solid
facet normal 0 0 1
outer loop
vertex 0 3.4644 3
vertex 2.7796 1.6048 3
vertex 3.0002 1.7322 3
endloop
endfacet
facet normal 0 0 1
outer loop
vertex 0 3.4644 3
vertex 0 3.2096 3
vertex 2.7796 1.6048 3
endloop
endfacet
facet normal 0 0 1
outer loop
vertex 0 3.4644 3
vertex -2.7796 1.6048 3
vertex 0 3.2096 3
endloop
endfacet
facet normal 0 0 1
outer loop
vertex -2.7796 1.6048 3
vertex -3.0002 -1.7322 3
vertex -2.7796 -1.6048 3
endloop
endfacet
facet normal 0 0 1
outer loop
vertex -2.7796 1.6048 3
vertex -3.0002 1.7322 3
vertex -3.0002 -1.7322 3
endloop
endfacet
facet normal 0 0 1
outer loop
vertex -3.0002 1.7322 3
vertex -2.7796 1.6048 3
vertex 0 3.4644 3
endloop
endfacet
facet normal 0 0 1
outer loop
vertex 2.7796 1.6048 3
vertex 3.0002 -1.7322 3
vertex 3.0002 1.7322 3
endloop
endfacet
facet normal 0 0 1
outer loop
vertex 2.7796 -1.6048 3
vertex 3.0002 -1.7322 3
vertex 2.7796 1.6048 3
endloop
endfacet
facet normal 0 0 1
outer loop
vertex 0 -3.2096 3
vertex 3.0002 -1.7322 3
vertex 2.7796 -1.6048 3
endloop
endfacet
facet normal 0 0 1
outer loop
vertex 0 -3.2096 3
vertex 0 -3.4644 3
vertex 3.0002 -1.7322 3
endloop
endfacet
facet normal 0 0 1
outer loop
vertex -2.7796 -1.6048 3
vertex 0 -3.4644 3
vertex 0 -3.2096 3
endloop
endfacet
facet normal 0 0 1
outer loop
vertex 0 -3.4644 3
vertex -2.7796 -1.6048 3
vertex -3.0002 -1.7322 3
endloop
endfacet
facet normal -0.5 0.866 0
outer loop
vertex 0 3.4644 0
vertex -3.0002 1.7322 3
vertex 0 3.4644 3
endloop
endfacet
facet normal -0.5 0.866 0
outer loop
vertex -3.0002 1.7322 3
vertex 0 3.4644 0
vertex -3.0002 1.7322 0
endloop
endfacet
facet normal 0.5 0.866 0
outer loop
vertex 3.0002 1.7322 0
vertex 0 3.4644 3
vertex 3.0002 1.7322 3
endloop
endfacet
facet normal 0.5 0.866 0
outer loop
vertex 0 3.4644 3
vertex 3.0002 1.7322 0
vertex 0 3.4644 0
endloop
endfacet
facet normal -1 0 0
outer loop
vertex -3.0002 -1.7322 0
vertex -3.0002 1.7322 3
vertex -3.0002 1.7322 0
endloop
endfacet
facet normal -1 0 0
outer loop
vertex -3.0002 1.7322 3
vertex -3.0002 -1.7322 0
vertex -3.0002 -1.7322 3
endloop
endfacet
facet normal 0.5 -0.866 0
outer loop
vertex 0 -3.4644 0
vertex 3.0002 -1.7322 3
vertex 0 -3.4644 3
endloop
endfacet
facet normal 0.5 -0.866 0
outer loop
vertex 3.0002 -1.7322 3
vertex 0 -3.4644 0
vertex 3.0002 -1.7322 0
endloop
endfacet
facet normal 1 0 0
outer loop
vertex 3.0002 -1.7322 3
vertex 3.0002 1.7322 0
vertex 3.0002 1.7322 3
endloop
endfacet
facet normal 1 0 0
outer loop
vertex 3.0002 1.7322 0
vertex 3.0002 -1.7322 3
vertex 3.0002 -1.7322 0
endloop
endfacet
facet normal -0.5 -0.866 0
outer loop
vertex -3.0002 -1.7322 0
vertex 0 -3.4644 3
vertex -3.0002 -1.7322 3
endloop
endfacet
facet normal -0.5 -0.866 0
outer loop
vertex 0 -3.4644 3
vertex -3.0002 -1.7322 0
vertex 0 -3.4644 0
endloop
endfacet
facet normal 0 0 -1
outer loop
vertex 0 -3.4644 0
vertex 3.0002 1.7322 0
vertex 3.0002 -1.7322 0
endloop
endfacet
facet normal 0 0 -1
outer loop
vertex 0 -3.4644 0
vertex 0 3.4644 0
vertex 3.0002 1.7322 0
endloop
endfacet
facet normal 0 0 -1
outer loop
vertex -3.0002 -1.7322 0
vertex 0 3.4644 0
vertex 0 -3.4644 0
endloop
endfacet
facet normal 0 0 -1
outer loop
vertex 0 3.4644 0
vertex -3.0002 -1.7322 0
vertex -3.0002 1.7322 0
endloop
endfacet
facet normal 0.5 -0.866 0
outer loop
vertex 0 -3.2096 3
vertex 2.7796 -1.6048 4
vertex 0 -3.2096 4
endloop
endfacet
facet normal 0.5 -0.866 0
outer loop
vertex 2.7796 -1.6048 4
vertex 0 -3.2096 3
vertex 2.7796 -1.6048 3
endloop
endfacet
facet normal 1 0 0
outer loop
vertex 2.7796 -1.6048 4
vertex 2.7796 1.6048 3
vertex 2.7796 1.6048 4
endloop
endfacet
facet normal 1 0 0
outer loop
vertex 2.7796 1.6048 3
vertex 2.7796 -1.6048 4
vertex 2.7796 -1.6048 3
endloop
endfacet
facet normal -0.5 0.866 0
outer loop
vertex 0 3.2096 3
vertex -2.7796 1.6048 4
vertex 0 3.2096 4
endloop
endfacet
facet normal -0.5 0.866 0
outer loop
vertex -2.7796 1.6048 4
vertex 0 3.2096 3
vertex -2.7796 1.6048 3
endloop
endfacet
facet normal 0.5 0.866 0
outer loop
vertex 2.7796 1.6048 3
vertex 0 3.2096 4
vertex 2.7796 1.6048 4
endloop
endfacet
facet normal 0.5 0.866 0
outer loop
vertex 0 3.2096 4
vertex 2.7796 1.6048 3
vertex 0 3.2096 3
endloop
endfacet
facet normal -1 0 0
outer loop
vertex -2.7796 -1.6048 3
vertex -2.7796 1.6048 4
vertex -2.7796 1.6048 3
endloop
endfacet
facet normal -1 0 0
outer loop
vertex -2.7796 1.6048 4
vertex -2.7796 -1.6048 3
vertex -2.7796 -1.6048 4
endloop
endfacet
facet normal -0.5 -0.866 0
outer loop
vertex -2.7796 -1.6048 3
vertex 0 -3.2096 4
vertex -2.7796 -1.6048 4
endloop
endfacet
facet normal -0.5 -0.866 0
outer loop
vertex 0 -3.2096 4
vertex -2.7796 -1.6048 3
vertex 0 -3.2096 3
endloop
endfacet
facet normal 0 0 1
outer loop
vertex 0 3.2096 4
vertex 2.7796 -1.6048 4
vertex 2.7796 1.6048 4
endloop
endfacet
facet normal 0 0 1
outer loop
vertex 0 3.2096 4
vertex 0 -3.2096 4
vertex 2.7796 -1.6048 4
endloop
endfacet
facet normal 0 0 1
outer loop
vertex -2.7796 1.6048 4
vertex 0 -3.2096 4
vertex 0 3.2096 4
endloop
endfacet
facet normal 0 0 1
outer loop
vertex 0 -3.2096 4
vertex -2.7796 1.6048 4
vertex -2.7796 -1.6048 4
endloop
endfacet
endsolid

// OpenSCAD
group() {
								group() {
									union() {
										multmatrix([[0.866025, -0.5, 0, 0], [0.5, 0.866025, 0, 0], [0, 0, 1, 0], [0, 0, 0, 1]]) {
											group() {
												multmatrix([[1, 0, 0, 0], [0, 1, 0, 0], [0, 0, 1, 0], [0, 0, 0, 1]]) {
													group() {
														cylinder($fn = 6, $fa = 12, $fs = 2, h = 3, r1 = 3.46439, r2 = 3.46439, center = false);
													}
												}
											}
										}
									}
								}
								group() {
									multmatrix([[0.866025, -0.5, 0, 0], [0.5, 0.866025, 0, 0], [0, 0, 1, 0], [0, 0, 0, 1]]) {
										cylinder($fn = 6, $fa = 12, $fs = 2, h = 4, r1 = 3.20959, r2 = 3.20959, center = false);
									}
								}
							}
